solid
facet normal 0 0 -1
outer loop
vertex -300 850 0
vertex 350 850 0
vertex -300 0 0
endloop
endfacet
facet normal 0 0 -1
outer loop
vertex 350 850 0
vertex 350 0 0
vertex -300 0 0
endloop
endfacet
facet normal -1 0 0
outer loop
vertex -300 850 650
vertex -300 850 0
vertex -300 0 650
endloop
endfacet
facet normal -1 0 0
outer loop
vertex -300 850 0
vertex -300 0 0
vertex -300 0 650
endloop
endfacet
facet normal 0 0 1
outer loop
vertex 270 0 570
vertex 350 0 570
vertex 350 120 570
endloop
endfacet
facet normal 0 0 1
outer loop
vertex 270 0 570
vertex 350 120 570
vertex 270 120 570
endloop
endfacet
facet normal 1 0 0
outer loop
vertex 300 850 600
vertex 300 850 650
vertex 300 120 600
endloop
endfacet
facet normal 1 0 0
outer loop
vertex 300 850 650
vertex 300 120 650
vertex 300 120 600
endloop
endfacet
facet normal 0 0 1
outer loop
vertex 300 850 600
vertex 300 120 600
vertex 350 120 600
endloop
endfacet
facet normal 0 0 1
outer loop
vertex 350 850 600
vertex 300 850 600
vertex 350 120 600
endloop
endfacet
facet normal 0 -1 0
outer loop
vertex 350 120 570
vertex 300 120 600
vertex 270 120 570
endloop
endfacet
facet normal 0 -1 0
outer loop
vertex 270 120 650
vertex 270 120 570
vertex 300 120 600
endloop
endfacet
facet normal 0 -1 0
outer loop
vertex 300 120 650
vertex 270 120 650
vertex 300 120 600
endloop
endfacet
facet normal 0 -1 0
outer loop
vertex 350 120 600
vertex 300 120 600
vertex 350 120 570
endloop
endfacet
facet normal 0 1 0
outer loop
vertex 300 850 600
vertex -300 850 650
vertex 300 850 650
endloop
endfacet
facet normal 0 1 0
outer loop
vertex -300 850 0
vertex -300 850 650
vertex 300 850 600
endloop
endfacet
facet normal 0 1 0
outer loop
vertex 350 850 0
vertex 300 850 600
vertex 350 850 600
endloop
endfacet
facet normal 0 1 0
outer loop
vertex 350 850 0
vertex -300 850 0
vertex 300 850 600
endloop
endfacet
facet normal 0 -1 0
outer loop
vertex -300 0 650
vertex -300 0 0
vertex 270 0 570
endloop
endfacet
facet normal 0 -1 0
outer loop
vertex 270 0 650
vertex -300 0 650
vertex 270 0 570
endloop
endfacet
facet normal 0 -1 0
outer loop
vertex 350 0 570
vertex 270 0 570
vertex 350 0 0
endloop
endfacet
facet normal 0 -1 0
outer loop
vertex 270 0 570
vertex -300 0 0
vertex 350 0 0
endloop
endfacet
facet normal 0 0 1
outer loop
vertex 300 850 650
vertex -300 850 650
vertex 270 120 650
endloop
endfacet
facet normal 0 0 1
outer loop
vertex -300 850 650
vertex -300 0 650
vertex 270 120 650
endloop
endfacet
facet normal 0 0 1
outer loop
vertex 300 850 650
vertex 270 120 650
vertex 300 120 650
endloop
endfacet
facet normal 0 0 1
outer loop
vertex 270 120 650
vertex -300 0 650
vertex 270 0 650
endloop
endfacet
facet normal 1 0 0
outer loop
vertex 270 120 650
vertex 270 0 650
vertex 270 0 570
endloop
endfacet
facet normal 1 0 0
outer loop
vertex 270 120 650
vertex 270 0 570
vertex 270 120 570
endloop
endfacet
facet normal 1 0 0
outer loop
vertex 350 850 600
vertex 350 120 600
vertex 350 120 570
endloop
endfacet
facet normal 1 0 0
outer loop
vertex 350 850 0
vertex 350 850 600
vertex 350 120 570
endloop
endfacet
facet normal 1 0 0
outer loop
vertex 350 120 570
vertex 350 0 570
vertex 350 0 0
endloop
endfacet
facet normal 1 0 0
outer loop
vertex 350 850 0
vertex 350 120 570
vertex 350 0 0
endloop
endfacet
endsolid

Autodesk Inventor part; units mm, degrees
ref_plane "YZ Plane" through (0, 0, 0) normal (1, 0, 0) x (0, 1, 0)
ref_plane "XZ Plane" through (0, 0, 0) normal (0, 1, 0) x (-1, 0, 0)
ref_plane "XY Plane" through (0, 0, 0) normal (0, 0, 1) x (1, 0, 0)
sketch "Sketch1" plane through (0, 0, 0) normal (0, 1, 0) x (1, 0, 0)
  line L0 (300, 0) -> (-300, 0)
  line L1 (-300, 0) -> (-300, -600)
  line L2 (-300, -600) -> (300, -600)
  line L3 (300, -600) -> (300, 0)
  point P0 (0, 0)
  point P1 (0, 0)
  dimension "d0" = 600
  dimension "d1" = 600
extrude "Extrusion1" add sketch "Sketch1" along normal blind 850
sketch "Sketch2" plane through (-300, 0, 600) normal (0, 0, 1) x (-1, 0, 0)
  line L0 (-600, 0) -> (-600, -850) projected
  line L1 (-600, 0) -> (-570, 0)
  line L2 (-570, 0) -> (-570, -120)
  line L3 (-570, -120) -> (-600, -120)
  line L4 (-600, -120) -> (-600, 0)
  point P0 (-300, 0)
  dimension "d4" = 120
  dimension "d7" = 30
extrude "Extrusion2" cut sketch "Sketch2" against normal blind 30
move faces "Move3" translate (50, 0, 0) faces at (300, 323.3333, 190)
move faces "Move4" translate (0, 0, 50) faces at (-110, 323.3333, 600)
sketch "Sketch3" plane through (270, 120, 570) normal (0, -1, 0) x (1, 0, 0)
  line L0 (-570, 80) -> (80, 80) projected
  line L1 (80, 80) -> (30, 80)
  line L2 (30, 80) -> (30, 30)
  line L3 (30, 30) -> (80, 30)
  line L4 (80, 30) -> (80, 80)
  line L5 (-570, 80) -> (-570, -570) projected
  line L6 (-570, -570) -> (80, -570) projected
  point P0 (-270, -570)
  dimension "d20" = 600
  dimension "d21" = 600
extrude "Extrusion3" cut sketch "Sketch3" against normal through all
properties part number "Mobile angolo"
